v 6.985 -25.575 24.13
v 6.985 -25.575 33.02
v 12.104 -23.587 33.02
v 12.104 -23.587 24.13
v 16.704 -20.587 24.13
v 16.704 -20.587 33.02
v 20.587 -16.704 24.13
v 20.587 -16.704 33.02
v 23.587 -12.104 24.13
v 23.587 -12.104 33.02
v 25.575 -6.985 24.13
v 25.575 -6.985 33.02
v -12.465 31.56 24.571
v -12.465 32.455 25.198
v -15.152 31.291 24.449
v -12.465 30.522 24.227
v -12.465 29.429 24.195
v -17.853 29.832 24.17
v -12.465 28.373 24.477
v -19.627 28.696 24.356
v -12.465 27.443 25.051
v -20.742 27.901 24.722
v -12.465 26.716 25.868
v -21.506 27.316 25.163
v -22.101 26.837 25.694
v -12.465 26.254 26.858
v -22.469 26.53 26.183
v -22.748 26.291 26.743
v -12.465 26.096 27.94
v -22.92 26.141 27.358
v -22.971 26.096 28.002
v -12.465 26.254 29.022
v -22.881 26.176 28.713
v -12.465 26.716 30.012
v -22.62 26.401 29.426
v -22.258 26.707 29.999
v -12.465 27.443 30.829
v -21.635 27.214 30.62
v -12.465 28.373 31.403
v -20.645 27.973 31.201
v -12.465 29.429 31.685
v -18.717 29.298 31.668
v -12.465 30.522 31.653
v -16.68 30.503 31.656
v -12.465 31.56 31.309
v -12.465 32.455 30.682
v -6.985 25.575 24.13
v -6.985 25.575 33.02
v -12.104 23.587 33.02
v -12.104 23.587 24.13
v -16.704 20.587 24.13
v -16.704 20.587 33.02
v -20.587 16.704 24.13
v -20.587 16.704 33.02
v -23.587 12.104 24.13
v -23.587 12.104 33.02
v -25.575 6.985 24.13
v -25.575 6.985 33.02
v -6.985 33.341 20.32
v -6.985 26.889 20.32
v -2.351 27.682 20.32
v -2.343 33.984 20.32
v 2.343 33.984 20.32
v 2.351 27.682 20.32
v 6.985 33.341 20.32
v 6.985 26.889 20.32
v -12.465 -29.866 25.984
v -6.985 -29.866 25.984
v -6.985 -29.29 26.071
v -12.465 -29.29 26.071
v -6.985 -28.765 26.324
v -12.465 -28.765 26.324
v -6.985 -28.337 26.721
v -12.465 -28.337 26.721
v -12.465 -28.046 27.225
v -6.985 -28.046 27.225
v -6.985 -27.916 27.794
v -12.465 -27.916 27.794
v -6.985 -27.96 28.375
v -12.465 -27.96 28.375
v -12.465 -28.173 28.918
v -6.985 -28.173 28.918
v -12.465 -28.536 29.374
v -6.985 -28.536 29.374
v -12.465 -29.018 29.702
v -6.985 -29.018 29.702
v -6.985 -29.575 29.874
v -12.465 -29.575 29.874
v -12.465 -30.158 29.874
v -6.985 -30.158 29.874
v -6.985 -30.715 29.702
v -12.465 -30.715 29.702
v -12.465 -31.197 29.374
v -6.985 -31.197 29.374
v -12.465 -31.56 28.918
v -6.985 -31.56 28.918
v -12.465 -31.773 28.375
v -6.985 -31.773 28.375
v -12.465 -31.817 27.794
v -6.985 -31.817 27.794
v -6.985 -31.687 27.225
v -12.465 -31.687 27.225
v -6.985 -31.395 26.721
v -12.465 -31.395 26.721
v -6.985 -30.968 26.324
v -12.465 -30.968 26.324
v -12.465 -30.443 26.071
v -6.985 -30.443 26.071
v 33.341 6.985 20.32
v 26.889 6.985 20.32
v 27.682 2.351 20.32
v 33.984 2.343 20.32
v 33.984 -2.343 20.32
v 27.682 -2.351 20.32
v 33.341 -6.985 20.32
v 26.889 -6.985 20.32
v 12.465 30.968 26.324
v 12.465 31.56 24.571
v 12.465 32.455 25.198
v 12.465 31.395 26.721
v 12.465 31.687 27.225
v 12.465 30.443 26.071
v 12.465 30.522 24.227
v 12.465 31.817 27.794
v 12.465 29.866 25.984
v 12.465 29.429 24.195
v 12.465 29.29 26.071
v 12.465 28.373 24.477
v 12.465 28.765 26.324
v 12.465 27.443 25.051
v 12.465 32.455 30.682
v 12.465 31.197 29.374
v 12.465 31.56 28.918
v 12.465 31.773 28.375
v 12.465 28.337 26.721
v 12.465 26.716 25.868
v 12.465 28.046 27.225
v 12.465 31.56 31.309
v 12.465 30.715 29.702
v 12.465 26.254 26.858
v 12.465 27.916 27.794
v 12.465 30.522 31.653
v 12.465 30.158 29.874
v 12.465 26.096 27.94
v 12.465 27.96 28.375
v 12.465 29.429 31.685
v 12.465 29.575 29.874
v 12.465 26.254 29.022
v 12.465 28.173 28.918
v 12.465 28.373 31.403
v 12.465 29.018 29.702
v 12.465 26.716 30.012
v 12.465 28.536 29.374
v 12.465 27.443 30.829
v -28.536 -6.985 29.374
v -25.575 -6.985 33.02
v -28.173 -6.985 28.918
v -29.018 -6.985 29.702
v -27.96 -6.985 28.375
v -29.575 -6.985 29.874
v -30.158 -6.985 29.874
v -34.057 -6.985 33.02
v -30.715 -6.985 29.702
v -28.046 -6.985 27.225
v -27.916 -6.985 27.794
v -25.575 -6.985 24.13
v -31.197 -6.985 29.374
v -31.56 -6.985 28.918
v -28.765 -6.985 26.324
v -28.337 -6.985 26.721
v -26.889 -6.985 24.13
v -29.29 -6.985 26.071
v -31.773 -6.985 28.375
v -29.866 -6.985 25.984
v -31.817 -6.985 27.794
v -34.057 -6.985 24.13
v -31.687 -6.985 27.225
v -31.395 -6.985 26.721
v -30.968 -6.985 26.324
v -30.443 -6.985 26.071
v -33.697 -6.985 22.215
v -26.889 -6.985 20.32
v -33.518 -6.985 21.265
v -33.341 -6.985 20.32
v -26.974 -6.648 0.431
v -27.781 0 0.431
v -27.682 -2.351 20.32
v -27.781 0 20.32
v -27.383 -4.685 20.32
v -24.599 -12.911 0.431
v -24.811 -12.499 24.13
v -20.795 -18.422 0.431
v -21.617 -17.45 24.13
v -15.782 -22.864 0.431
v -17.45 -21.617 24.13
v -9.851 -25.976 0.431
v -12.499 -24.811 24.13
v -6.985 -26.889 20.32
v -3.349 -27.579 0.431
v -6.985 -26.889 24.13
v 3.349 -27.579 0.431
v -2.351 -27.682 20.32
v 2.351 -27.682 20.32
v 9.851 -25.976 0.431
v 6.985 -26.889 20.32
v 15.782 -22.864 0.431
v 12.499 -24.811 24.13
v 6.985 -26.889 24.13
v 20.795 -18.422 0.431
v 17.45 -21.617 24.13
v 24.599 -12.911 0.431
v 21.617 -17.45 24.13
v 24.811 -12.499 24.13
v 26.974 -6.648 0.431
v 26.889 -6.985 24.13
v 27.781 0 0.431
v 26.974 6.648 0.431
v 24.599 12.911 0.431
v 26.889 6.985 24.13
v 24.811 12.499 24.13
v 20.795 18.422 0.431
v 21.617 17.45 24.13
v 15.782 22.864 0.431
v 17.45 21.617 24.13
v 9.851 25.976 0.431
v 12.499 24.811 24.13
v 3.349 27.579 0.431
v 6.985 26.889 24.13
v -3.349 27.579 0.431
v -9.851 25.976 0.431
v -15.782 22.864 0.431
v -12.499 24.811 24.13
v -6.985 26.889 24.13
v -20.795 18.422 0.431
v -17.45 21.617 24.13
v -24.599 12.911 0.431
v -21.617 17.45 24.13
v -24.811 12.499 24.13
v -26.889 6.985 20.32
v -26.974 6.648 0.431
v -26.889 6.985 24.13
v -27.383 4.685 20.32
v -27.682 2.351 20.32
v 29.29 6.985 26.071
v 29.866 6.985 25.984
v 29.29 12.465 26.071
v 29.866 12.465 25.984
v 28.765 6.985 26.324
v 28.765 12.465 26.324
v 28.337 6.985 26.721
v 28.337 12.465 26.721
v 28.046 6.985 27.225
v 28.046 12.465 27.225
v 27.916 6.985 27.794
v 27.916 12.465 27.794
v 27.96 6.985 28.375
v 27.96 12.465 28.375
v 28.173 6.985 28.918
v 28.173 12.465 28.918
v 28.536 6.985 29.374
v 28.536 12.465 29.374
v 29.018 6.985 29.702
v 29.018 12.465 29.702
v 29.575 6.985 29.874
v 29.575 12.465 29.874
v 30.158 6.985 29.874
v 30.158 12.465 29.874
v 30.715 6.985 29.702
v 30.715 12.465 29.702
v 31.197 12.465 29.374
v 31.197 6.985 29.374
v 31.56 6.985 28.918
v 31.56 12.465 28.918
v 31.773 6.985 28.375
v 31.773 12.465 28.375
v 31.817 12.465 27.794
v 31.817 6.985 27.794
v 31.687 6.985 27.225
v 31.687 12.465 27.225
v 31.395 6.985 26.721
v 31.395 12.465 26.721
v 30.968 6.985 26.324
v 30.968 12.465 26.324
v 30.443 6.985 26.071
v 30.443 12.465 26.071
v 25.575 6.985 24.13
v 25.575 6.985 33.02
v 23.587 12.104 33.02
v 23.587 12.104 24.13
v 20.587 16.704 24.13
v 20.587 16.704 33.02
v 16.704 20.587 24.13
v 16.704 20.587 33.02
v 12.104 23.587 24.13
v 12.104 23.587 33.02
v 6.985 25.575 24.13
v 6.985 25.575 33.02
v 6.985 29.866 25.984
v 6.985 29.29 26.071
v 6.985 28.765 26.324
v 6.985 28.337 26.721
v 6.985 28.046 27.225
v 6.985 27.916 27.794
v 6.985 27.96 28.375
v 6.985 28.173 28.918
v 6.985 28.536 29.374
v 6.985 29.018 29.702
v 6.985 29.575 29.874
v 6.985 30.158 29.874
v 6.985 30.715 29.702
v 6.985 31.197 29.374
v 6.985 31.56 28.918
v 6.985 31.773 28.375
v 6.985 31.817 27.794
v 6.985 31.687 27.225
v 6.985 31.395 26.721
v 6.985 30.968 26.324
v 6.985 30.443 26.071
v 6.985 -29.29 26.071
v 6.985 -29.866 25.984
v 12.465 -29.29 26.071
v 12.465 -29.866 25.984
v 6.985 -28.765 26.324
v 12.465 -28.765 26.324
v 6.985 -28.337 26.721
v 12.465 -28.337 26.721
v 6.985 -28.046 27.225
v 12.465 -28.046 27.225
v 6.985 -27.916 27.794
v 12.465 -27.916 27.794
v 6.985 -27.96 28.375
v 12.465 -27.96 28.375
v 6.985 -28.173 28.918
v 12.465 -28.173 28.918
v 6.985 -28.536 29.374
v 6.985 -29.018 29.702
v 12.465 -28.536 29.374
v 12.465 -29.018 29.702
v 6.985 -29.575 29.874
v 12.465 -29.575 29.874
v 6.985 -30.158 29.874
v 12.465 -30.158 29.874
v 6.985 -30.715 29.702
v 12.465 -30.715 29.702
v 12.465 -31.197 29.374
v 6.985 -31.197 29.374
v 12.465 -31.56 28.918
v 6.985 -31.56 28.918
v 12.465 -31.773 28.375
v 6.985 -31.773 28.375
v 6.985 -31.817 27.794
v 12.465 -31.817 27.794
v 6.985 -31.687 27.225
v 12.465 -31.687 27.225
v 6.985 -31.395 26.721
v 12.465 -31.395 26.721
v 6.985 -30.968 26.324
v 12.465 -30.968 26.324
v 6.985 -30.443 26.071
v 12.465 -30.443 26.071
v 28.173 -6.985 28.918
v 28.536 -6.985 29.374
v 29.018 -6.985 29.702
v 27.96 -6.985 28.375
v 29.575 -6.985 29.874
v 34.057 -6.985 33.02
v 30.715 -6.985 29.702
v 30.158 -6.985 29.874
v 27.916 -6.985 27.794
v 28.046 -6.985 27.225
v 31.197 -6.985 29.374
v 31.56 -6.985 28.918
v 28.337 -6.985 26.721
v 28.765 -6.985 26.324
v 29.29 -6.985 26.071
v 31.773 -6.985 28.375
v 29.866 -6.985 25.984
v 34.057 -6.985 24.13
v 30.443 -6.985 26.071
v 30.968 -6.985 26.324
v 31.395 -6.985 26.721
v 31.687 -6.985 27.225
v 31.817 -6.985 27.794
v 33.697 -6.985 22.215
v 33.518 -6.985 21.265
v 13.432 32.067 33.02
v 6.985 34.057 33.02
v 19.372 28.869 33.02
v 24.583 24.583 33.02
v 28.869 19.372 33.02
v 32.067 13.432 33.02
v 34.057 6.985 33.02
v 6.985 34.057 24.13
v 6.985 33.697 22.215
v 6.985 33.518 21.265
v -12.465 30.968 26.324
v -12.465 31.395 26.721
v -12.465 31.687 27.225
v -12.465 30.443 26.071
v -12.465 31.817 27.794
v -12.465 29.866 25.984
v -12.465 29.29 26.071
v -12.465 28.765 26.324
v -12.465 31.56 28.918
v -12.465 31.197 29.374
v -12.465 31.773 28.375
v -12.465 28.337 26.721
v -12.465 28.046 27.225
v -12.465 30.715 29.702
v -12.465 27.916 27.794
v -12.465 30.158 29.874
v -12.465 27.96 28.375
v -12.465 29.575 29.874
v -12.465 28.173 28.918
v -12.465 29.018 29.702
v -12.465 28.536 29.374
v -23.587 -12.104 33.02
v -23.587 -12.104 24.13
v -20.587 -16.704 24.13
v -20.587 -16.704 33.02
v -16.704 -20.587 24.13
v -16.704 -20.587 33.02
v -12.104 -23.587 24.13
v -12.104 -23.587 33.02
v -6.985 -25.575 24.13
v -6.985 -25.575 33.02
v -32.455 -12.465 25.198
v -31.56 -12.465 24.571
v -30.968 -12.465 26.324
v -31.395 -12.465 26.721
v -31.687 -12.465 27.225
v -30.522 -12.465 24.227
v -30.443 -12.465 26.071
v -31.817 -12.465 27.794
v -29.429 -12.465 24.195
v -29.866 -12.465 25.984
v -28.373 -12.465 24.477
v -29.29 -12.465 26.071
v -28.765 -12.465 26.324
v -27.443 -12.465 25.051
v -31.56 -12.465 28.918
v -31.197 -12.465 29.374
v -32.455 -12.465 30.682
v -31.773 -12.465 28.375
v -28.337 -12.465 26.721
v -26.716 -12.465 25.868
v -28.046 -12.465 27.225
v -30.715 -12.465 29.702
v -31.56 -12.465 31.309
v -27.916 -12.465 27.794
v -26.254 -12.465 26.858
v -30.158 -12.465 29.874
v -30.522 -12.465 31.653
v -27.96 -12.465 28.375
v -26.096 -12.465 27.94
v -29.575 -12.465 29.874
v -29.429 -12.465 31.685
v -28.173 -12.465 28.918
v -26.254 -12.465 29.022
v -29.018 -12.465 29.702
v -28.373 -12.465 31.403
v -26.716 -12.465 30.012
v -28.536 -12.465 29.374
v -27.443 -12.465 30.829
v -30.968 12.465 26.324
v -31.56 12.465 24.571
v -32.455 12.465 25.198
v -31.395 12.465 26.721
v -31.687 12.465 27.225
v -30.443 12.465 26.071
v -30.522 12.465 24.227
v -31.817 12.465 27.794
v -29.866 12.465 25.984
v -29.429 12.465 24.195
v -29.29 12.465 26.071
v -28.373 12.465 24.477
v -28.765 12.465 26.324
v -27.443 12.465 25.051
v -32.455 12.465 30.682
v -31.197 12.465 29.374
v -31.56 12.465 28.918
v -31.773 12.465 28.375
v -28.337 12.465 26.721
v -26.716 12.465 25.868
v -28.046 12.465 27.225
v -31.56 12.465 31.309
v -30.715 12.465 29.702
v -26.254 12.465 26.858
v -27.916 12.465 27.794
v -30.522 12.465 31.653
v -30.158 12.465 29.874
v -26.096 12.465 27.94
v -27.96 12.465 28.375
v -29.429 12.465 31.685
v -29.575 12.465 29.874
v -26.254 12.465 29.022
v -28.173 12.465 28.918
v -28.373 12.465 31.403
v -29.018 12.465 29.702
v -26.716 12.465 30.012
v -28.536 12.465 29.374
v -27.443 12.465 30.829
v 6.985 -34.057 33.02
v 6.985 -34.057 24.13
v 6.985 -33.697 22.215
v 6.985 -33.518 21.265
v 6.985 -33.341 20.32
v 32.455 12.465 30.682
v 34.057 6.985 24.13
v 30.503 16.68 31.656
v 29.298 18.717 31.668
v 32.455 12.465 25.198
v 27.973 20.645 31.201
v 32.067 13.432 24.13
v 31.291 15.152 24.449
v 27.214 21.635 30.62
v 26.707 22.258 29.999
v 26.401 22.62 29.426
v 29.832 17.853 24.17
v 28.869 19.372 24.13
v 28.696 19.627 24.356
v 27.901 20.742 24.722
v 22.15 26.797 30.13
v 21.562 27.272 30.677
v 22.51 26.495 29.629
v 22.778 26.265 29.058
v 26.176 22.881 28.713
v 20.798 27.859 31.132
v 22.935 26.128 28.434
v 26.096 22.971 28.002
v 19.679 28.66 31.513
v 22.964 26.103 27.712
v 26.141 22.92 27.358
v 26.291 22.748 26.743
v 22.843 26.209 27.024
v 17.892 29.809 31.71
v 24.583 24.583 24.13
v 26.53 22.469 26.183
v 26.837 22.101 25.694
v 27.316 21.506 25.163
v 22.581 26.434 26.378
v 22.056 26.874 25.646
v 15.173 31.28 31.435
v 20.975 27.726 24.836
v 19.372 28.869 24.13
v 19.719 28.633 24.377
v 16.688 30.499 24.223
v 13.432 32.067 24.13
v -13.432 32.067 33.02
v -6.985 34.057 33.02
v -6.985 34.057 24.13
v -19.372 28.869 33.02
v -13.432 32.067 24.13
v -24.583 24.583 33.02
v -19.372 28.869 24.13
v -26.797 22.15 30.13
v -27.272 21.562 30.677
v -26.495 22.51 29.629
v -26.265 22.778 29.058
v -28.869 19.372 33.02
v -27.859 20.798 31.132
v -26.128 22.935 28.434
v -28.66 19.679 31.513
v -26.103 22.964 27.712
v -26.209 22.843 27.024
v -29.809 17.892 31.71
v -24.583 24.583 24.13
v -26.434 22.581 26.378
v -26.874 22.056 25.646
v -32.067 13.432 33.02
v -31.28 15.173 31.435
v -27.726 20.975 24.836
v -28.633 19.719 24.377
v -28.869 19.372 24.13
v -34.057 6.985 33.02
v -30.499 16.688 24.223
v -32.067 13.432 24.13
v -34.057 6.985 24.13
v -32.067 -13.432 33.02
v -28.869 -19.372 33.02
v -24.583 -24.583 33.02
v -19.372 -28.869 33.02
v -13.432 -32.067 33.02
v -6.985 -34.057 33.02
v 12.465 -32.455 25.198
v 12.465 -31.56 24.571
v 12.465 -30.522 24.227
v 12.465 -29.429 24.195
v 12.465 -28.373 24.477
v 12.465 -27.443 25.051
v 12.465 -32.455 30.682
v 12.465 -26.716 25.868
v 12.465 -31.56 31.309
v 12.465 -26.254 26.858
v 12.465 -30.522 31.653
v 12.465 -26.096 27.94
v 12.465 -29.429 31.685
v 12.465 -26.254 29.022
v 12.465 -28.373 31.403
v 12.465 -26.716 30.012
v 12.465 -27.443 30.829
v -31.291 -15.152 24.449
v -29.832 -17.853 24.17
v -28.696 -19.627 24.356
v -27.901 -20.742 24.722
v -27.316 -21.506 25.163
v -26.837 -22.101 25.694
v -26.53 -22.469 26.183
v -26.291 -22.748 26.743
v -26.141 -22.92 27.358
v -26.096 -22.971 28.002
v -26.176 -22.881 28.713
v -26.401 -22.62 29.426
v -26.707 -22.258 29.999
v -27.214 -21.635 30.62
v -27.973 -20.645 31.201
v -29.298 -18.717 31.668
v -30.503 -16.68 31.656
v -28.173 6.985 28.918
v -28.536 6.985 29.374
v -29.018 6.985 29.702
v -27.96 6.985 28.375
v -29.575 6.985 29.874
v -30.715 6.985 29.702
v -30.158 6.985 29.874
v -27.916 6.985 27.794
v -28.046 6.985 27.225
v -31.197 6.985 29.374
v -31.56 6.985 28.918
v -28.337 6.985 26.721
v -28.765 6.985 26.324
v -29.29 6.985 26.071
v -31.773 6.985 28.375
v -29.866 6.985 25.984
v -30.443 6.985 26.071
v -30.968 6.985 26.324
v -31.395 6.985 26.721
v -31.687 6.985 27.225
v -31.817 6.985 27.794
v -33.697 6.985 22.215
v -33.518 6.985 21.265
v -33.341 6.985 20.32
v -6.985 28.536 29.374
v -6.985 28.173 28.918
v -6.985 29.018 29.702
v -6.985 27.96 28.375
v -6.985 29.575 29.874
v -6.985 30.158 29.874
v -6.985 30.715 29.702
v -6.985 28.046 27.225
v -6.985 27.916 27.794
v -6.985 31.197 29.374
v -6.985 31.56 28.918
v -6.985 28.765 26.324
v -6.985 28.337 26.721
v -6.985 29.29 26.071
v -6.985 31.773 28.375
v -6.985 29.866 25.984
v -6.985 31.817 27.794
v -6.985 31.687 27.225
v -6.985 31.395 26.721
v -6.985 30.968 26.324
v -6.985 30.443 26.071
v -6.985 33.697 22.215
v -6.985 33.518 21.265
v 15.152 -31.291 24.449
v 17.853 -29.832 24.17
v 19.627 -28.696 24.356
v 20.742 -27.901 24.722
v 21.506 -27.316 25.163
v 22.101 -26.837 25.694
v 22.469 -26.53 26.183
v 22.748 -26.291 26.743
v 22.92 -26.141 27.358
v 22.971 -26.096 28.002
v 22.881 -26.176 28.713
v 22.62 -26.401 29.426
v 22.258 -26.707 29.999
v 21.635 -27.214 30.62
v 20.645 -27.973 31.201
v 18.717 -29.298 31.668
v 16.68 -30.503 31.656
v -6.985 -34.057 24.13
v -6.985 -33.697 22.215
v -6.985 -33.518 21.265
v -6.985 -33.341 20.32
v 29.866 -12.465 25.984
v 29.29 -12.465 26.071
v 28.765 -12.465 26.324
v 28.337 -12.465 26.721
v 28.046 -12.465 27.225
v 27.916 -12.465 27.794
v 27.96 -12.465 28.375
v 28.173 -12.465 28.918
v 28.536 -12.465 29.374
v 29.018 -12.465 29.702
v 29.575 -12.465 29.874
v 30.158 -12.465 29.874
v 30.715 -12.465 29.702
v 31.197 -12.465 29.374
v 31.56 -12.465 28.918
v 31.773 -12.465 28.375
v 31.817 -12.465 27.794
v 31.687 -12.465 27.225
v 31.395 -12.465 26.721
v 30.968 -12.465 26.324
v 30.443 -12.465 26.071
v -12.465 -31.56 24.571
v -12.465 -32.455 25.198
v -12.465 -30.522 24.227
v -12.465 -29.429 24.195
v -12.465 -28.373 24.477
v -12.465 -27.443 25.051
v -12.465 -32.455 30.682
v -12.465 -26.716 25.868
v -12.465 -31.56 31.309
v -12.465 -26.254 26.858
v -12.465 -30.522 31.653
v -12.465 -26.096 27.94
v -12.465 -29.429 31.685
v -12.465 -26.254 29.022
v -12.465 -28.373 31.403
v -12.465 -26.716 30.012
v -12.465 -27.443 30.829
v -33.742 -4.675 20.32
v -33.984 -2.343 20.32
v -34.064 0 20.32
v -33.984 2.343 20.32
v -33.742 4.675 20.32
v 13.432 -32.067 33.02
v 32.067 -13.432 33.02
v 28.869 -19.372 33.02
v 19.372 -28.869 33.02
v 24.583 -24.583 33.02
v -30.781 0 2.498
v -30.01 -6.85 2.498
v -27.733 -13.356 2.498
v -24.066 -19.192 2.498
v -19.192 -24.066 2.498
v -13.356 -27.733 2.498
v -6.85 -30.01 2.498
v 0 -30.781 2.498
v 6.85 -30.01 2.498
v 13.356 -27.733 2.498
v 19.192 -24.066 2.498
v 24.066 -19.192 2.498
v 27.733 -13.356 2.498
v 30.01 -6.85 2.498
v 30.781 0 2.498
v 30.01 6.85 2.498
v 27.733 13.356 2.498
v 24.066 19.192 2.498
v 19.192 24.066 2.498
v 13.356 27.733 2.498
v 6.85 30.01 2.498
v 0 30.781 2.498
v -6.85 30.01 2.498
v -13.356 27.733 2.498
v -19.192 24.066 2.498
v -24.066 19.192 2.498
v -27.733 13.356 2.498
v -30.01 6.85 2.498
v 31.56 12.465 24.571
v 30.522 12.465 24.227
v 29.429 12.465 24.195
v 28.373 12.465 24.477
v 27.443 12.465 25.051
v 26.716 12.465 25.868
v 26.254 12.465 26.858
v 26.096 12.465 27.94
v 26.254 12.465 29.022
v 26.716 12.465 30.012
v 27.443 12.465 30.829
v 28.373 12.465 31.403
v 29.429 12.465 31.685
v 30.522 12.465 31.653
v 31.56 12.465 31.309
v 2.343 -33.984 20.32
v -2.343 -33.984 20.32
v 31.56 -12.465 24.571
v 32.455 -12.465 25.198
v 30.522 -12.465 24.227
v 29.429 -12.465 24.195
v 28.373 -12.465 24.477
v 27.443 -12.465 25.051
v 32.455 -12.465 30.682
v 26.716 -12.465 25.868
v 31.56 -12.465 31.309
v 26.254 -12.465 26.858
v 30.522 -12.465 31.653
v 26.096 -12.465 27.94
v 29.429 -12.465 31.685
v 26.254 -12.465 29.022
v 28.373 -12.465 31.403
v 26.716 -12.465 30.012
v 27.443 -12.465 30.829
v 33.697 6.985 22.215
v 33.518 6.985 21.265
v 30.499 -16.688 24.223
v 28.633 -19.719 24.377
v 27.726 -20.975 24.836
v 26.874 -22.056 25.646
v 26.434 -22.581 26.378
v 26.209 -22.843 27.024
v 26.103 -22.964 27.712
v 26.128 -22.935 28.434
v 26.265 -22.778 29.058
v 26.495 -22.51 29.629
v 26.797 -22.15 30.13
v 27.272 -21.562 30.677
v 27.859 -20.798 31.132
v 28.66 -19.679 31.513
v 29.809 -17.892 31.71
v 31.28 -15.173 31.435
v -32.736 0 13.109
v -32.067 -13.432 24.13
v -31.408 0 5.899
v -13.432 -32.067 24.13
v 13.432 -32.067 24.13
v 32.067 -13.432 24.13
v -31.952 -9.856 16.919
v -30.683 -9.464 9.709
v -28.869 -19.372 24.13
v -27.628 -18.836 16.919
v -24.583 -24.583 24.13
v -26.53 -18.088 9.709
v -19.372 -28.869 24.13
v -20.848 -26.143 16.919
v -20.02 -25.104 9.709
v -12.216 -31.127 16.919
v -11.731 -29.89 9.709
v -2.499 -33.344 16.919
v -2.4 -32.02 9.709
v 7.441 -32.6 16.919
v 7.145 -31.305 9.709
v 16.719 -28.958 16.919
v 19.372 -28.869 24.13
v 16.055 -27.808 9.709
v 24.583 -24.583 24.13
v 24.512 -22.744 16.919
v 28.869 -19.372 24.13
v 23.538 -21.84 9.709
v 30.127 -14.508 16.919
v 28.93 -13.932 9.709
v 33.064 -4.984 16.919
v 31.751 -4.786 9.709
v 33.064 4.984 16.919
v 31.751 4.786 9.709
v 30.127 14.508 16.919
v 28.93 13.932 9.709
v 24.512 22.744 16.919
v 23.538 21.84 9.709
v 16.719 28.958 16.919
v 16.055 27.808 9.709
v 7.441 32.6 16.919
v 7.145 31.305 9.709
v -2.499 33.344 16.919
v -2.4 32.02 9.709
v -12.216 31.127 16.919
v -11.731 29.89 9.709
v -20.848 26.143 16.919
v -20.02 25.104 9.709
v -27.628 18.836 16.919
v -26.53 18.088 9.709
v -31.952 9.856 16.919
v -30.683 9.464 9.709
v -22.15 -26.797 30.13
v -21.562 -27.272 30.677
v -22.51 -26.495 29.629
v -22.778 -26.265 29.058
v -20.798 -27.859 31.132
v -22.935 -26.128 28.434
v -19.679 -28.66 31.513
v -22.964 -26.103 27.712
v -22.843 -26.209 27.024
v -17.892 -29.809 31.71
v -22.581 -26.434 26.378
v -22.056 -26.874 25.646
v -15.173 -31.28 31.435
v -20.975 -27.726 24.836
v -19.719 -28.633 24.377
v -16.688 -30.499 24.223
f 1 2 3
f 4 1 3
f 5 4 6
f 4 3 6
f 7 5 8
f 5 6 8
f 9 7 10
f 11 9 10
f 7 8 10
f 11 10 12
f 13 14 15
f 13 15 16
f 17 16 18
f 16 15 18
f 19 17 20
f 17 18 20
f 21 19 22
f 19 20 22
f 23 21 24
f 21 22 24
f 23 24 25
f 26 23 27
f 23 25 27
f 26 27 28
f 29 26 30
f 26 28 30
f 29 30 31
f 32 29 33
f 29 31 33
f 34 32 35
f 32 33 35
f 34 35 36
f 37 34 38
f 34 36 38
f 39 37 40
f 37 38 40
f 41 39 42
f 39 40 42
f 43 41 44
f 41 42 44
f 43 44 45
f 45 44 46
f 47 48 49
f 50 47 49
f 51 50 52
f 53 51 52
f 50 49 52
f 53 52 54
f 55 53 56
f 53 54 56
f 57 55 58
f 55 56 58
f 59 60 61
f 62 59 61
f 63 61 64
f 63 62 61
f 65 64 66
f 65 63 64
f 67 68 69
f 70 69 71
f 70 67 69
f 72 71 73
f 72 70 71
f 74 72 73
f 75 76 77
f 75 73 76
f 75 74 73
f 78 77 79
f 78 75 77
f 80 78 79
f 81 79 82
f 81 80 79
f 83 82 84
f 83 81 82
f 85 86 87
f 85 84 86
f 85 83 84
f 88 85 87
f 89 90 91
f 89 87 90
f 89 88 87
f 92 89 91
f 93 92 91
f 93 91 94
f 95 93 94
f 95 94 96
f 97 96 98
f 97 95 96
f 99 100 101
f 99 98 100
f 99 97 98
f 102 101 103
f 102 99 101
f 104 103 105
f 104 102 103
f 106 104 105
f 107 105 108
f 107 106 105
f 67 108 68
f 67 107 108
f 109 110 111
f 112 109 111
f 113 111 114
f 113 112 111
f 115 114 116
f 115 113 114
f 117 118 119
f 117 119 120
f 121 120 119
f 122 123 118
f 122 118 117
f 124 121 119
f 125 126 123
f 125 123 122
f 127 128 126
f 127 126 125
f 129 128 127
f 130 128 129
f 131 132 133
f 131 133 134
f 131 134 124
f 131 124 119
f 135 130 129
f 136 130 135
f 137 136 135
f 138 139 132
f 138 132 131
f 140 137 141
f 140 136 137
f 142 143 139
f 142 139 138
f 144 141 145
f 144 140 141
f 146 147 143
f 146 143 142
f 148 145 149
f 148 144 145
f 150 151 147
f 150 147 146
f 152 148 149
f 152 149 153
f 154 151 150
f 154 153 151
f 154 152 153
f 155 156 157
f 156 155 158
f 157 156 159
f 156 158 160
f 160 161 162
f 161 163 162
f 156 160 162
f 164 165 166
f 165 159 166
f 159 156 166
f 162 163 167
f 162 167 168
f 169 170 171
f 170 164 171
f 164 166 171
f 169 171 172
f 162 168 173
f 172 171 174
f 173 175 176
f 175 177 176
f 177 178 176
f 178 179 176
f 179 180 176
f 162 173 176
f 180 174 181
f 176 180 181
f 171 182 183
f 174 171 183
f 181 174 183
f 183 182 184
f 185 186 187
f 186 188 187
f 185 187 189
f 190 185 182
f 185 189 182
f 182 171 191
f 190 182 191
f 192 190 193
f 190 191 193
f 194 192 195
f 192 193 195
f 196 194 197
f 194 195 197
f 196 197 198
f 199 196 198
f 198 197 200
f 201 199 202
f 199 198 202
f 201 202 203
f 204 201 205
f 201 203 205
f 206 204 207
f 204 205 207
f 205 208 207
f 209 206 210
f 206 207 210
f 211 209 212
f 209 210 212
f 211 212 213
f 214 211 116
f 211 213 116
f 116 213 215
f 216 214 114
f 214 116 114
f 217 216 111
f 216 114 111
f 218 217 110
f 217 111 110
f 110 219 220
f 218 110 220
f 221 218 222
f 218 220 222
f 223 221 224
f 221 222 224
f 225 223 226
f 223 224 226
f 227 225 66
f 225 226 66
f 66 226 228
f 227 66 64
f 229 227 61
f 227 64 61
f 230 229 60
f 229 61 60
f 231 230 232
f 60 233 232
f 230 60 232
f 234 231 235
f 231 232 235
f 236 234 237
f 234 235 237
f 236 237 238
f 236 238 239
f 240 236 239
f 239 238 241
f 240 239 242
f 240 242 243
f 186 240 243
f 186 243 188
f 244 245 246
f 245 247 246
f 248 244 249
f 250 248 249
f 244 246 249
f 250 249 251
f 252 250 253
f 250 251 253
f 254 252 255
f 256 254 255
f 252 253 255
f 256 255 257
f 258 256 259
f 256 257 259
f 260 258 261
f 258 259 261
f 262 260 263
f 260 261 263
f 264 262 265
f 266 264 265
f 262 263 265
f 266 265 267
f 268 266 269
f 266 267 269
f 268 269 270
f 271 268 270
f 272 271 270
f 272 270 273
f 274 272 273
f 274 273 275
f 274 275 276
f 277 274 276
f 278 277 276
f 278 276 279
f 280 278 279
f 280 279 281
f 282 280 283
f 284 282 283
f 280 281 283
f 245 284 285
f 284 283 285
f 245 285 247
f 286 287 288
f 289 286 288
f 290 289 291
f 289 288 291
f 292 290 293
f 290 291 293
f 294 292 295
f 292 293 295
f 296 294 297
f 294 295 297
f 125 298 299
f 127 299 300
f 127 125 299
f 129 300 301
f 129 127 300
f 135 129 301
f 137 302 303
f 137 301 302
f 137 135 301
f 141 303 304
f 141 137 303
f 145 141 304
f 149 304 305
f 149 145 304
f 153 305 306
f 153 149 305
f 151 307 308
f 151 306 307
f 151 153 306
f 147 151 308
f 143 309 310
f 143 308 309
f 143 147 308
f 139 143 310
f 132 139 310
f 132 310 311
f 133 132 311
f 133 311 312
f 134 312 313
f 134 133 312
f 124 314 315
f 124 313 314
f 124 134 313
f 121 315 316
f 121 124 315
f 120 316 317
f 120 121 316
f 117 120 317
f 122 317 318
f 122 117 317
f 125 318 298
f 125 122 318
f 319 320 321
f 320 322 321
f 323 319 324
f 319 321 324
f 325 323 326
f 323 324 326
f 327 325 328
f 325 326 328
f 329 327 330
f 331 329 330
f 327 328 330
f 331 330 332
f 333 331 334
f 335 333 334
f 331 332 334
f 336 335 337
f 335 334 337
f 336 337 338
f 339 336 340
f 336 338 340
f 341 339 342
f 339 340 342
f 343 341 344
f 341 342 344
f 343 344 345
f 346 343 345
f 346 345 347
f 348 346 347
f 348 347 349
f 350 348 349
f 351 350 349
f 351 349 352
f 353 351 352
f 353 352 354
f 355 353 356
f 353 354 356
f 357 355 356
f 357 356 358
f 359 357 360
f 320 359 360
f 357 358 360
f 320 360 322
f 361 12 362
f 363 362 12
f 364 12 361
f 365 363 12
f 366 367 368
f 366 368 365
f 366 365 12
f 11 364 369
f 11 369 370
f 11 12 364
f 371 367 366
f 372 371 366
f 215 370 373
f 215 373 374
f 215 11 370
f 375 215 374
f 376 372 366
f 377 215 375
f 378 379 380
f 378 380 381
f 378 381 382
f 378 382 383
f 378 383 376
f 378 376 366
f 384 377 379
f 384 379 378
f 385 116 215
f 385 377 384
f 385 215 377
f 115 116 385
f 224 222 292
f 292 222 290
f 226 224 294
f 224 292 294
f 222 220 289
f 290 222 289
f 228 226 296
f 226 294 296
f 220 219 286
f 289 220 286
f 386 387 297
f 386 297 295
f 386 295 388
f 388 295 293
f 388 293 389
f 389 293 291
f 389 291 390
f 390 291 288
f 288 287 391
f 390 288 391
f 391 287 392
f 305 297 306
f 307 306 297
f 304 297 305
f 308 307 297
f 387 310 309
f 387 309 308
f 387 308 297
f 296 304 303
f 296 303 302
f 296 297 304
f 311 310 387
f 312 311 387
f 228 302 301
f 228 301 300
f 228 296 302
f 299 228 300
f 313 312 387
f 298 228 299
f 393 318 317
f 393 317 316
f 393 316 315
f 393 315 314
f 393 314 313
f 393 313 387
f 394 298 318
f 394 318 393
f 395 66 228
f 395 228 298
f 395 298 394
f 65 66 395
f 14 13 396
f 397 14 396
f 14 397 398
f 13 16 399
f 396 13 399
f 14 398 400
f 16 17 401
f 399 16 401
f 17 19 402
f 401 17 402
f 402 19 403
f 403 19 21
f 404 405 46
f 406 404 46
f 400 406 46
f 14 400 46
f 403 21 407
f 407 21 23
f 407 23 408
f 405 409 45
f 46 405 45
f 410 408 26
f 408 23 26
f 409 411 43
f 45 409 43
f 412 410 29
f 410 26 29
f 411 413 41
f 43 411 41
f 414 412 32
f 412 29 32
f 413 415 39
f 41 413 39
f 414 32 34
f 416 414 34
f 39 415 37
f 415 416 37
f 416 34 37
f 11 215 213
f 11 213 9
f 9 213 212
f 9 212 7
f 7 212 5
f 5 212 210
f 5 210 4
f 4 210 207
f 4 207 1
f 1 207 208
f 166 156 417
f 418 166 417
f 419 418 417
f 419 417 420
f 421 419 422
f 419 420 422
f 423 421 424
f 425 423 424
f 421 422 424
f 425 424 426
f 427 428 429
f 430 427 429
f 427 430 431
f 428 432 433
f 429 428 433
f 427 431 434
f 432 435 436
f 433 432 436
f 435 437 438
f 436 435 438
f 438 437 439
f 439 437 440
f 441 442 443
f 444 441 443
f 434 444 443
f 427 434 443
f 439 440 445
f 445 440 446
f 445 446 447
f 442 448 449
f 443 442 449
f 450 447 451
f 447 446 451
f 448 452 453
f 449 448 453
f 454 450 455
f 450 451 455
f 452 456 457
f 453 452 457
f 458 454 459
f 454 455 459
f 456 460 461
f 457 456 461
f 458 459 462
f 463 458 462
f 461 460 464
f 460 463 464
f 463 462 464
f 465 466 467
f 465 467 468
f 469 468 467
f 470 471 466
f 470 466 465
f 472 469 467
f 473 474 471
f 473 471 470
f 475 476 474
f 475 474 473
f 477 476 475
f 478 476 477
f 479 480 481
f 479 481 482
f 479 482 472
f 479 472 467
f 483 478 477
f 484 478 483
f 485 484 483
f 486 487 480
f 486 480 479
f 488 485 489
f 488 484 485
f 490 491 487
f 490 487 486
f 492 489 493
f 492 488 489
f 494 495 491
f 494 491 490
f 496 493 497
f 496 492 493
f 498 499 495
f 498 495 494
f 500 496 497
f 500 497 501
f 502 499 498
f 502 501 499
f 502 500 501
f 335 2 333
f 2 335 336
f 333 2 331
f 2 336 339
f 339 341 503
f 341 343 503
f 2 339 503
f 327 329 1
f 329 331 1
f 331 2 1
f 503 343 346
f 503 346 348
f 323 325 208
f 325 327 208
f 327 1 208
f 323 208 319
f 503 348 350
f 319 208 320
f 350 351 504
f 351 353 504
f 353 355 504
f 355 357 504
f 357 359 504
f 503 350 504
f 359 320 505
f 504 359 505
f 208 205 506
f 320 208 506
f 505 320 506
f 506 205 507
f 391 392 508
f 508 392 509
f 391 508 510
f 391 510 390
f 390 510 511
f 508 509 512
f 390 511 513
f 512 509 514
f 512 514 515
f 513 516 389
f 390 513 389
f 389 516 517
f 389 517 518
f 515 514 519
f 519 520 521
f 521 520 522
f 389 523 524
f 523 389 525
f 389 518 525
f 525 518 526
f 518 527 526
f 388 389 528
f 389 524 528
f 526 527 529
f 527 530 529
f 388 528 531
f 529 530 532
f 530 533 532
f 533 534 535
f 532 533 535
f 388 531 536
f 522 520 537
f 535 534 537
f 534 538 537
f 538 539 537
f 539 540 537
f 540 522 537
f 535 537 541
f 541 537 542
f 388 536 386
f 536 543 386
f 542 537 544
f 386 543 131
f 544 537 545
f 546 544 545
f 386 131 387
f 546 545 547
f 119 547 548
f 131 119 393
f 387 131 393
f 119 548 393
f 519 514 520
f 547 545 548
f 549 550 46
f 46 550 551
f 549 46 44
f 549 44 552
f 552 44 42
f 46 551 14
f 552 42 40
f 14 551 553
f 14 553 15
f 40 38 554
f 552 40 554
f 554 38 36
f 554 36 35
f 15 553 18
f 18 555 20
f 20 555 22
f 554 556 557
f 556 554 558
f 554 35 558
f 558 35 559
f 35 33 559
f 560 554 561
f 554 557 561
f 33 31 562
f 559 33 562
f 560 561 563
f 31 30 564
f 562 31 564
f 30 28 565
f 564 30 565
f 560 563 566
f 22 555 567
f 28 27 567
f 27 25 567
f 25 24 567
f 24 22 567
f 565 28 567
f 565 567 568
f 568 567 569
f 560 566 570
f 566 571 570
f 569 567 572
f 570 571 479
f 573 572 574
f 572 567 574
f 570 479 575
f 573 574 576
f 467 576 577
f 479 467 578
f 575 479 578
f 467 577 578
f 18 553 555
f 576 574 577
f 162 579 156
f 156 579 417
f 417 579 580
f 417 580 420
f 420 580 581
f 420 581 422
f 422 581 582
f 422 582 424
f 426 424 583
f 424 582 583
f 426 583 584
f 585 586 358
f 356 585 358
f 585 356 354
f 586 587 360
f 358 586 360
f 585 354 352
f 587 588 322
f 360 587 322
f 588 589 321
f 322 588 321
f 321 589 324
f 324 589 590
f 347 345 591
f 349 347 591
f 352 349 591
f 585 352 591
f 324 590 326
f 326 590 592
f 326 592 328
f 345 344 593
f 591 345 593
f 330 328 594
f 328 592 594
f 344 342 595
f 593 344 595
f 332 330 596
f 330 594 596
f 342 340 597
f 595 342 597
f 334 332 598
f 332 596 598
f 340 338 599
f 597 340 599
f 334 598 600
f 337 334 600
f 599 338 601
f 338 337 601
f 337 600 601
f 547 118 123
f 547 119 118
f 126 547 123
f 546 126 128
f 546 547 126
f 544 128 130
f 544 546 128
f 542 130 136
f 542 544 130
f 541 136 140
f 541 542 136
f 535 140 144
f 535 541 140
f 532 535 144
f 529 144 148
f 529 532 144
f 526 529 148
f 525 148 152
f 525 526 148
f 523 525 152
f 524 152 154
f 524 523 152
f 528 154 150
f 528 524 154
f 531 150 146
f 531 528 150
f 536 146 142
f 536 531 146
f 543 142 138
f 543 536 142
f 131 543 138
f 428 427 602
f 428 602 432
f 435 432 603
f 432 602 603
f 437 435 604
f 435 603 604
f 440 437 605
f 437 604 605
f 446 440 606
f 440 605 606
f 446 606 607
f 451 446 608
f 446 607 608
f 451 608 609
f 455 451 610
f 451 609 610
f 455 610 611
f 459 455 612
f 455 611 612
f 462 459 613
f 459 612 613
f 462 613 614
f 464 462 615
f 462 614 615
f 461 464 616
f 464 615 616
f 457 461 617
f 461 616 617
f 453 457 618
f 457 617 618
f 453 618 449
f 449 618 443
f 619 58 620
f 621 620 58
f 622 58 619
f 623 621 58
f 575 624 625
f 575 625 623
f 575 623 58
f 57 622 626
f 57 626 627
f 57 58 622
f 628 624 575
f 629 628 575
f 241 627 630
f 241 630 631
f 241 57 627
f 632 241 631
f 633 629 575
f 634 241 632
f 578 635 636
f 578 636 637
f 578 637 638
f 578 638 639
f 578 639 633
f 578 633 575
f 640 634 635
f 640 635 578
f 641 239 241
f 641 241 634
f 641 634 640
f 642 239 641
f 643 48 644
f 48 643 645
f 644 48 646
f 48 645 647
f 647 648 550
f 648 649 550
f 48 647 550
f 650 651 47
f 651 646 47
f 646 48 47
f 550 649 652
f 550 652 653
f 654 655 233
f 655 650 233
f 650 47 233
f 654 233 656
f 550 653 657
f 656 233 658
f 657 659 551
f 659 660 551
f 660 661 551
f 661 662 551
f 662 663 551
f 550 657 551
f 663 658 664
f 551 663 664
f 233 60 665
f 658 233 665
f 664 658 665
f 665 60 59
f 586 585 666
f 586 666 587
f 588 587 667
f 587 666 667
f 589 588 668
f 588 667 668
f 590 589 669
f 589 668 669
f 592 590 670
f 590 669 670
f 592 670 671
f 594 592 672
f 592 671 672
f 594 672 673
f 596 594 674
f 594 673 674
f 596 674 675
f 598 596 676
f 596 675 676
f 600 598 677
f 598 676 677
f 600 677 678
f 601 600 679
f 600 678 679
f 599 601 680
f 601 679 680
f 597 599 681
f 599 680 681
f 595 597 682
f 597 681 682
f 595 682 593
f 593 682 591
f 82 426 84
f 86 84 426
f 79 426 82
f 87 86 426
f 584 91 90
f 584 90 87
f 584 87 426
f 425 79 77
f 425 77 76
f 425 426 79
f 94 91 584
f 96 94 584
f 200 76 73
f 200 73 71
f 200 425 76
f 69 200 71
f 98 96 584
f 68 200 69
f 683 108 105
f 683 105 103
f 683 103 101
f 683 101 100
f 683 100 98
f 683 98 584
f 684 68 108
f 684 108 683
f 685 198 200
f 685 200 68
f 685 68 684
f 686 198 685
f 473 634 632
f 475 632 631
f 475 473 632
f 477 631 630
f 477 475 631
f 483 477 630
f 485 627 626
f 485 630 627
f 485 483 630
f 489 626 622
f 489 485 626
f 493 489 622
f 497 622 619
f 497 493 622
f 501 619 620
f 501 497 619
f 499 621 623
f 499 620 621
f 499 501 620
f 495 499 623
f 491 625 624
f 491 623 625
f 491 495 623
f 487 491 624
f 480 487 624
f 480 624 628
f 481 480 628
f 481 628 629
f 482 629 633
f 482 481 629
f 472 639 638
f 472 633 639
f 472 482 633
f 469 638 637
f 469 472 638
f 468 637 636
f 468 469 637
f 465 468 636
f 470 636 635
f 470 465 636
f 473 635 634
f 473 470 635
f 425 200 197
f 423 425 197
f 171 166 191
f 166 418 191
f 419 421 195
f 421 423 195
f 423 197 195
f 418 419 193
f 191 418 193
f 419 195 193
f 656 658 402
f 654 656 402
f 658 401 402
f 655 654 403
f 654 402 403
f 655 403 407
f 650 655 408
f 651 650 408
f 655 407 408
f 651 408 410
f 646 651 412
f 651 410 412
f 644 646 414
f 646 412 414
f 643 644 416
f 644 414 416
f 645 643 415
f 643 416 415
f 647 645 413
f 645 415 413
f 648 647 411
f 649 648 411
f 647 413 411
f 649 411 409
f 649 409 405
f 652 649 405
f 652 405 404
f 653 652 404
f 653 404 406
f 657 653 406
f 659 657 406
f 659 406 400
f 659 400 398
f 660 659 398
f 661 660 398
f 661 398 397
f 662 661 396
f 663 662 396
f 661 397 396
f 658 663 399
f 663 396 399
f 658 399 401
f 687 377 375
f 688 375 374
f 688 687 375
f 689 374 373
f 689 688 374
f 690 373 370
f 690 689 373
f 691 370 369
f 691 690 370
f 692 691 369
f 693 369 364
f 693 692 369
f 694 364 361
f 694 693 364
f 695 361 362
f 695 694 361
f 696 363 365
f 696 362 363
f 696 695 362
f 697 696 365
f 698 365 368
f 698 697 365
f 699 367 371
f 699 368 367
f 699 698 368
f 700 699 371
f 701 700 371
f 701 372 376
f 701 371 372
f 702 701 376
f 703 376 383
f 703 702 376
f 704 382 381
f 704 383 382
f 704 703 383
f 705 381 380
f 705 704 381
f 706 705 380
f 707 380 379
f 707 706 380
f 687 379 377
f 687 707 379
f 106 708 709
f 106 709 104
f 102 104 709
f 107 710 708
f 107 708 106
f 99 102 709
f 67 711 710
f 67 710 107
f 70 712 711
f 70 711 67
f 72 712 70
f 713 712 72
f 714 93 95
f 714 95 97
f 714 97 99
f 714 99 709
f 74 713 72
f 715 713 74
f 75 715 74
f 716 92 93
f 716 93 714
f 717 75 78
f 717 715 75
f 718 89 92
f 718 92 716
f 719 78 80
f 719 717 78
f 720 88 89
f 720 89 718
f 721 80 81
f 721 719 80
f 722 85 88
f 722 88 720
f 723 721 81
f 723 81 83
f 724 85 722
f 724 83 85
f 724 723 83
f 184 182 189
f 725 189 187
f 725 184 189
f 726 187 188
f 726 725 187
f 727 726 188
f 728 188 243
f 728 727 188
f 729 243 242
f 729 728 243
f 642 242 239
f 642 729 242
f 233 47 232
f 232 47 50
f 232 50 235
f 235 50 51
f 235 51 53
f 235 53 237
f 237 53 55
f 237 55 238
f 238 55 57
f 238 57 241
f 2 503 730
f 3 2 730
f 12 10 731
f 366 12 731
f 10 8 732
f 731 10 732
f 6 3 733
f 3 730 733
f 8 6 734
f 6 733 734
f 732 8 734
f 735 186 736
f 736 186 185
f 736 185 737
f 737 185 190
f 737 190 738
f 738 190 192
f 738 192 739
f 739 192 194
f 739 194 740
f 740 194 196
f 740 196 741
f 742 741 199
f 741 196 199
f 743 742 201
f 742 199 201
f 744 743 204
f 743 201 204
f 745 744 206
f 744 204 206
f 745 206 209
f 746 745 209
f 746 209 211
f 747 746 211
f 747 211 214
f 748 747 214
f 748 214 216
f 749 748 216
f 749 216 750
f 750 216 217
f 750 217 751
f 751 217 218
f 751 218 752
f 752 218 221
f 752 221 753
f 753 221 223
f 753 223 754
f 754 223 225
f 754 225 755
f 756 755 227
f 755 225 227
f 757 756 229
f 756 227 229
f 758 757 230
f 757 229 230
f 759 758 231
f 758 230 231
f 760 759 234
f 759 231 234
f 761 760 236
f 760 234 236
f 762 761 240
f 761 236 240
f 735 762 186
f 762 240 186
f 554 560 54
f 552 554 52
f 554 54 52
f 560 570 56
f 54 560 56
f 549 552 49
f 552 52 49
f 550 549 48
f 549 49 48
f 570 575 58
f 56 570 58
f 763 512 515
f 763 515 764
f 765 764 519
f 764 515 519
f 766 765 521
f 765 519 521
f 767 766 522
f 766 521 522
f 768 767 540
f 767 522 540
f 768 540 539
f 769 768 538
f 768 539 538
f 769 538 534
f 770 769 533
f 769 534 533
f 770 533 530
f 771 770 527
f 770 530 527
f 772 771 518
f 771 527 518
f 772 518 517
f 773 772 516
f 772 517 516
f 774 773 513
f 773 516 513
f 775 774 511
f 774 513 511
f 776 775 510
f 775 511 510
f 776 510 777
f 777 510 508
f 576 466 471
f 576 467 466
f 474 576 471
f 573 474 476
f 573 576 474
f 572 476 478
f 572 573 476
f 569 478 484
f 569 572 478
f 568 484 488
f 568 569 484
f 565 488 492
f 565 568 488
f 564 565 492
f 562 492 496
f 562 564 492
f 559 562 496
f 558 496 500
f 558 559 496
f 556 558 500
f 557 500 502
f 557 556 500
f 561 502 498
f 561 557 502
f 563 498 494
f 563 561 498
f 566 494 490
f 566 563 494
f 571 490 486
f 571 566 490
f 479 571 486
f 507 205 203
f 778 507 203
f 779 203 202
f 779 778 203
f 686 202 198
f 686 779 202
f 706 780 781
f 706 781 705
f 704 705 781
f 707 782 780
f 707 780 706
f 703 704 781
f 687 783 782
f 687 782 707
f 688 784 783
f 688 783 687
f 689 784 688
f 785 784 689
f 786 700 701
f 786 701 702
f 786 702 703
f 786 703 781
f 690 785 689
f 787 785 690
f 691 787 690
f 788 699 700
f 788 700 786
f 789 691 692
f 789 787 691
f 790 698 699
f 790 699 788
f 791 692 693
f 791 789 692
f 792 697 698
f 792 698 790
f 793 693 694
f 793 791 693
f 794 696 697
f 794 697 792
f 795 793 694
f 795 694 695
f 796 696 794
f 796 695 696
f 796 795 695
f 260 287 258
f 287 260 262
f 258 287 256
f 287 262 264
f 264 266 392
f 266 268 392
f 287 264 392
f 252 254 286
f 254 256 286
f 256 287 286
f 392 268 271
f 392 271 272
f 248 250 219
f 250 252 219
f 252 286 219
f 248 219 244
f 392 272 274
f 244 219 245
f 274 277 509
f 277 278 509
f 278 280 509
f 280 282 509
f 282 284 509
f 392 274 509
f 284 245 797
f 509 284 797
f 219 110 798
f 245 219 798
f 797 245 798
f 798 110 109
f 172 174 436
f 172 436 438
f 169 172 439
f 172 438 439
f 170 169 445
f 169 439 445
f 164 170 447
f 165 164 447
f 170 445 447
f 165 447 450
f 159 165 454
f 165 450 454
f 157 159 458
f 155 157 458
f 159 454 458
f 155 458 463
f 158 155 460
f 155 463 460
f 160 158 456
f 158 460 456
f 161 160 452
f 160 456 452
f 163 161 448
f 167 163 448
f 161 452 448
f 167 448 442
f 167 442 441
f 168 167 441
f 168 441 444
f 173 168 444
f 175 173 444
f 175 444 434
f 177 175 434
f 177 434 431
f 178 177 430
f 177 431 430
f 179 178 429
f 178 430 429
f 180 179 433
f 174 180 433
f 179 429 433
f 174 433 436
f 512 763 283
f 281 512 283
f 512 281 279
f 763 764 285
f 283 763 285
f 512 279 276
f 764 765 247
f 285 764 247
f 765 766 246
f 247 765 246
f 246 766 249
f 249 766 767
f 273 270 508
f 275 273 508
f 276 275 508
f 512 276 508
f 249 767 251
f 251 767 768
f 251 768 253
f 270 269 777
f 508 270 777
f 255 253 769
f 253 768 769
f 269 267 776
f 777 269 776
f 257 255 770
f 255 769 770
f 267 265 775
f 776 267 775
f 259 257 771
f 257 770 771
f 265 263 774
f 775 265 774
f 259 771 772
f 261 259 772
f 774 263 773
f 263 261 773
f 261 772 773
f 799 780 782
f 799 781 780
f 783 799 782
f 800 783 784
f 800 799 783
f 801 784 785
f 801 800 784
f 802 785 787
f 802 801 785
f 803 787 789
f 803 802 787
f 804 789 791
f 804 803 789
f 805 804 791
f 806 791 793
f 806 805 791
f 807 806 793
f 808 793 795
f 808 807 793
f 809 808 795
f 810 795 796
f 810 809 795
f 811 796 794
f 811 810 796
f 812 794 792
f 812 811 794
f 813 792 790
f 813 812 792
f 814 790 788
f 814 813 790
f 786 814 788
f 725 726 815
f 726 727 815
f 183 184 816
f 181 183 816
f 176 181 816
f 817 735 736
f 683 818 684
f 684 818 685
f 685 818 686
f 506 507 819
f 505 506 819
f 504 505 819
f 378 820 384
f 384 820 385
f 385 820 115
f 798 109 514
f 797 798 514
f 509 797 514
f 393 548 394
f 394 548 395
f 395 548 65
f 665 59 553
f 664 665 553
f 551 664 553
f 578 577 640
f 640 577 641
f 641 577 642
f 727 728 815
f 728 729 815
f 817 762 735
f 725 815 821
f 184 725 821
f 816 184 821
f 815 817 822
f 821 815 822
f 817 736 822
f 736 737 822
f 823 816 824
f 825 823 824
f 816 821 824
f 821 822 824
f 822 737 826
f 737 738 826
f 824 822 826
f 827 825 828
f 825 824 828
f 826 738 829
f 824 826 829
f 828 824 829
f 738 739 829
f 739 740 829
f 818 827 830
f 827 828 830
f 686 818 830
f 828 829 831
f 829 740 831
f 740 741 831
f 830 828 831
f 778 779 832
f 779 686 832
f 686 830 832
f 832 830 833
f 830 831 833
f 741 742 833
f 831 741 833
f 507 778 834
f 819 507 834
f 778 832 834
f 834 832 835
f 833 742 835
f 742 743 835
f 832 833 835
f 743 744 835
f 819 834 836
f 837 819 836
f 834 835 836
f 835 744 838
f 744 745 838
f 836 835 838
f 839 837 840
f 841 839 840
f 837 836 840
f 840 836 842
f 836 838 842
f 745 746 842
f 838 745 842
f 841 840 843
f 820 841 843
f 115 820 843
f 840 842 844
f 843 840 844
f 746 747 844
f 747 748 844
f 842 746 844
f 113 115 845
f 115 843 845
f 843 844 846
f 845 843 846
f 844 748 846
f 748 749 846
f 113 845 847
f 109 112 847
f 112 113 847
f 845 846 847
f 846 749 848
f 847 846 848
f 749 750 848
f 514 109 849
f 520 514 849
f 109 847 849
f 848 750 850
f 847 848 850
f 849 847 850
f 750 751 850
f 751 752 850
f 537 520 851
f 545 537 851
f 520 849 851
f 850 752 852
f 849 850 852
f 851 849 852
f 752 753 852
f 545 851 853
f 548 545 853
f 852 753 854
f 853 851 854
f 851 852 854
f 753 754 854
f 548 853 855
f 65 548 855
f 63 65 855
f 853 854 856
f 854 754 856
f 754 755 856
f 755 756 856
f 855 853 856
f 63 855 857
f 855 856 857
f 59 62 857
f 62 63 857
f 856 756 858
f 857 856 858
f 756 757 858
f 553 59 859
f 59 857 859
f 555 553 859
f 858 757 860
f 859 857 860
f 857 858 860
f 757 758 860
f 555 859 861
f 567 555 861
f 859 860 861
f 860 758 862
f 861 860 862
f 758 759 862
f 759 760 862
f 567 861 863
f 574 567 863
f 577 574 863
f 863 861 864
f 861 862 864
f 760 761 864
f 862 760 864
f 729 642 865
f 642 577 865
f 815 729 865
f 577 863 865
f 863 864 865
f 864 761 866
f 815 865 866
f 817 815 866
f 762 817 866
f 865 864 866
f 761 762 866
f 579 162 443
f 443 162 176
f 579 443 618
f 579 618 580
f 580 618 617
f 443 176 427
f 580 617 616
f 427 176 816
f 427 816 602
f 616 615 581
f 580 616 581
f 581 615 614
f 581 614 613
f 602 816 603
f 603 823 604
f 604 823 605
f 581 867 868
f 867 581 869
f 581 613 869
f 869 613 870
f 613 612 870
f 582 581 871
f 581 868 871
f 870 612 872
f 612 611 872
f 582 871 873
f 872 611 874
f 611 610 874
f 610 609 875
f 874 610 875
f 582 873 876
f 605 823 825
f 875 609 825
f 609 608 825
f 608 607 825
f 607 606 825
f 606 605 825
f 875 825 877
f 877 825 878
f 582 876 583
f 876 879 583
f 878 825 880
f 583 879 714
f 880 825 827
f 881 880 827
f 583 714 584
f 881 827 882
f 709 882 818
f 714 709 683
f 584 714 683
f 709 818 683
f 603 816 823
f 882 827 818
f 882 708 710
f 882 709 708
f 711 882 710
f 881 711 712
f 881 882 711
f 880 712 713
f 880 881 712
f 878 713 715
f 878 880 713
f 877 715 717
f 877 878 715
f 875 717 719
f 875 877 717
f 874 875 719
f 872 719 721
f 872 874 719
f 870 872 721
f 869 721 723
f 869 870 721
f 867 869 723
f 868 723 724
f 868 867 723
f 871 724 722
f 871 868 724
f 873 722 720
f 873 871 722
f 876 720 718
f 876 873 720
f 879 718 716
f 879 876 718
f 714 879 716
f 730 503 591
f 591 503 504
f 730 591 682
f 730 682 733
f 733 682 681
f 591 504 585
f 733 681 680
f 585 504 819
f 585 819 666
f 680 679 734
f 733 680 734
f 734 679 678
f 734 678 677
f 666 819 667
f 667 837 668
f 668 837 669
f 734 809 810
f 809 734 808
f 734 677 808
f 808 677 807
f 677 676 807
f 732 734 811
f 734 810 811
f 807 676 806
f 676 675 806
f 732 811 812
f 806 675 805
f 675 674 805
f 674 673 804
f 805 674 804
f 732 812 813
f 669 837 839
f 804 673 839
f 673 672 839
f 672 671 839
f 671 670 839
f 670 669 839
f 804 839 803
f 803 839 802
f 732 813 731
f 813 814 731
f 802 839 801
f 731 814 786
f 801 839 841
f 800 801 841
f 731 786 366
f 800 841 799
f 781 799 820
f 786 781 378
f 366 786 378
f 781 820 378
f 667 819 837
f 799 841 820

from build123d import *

# Parameters (mm, degrees)
PULLEY_RECESS_START = -12.7
SKETCH5_W           = 13.97
SKETCH5_H           = 12.7
PULLEY_RECESS_DEPTH = 72.92587845
CIRPATTERN1_COUNT   = 4
CHAMFER1_SIZE       = 2.54
CHAMFER1_SIZE_2     = 3.165934508


with BuildPart() as part:
    # Sketch1 → base_ring (revolve)
    with BuildSketch(Plane.YZ, mode=Mode.PRIVATE) as base_ring_sk:
        Polygon((27.78125, 0), (27.78125, 24.13), (26.51125, 24.13), (26.51125, 33.02), (34.76625, 33.02), (34.76625, 24.13), (30.32125, 0), align=None)
    revolve(base_ring_sk.sketch.rotate(Axis((0, 0, 0), (0, 0, 1)), 90), axis=Axis((0, 0, 0), (0, 0, 1)))

    # Sketch5 → pulley_recess (cut)
    with BuildSketch(Plane.XY.offset(33.02).offset(PULLEY_RECESS_START)):
        with Locations((0, 31.924521531)):
            Rectangle(SKETCH5_W, SKETCH5_H)
    pulley_recess = extrude(amount=PULLEY_RECESS_DEPTH, mode=Mode.SUBTRACT)

    # Sketch8 → pulley_bolt_hole (revolve, cut)
    with BuildSketch(Plane(origin=(34.76625, 29.86633275, 27.94), x_dir=(0, 0, -1), z_dir=(0, 1, 0))):
        Polygon((0, 0), (0, 39.275163199), (1.9558, 38.1), (1.9558, 22.3012), (3.77063, 22.3012), (3.77063, 0), align=None)
    pulley_bolt_hole = revolve(axis=Axis((41.11625, 29.86633275, 27.94), (-1, 0, 0)), mode=Mode.SUBTRACT)

    # bolthole_mirror: pulley_bolt_hole across plane
    add(pulley_bolt_hole.mirror(Plane(origin=(0, 0, 0), x_dir=(0, 0, 1), z_dir=(1, 0, 0))), mode=Mode.SUBTRACT)

    # CirPattern1: pulley_recess, pulley_bolt_hole ×4 about axis
    cirpattern1_axis = Axis((0, 0, 0), (0, 0, 1))
    add([pulley_recess.rotate(cirpattern1_axis, i * 360 / CIRPATTERN1_COUNT) for i in range(1, CIRPATTERN1_COUNT)], mode=Mode.SUBTRACT)
    add([pulley_bolt_hole.rotate(cirpattern1_axis, i * 360 / CIRPATTERN1_COUNT) for i in range(1, CIRPATTERN1_COUNT)], mode=Mode.SUBTRACT)

    # CirPattern1 copy 1 sketch → CirPattern1 copy 1 (revolve, cut)
    with BuildSketch(Plane(origin=(-29.86633275, -34.76625, 27.94), x_dir=(0, 0, -1), z_dir=(-1, 0, 0))):
        Polygon((0, 0), (0, -39.275163199), (1.9558, -38.1), (1.9558, -22.3012), (3.77063, -22.3012), (3.77063, 0), align=None)
    revolve(axis=Axis((-29.86633275, -41.11625, 27.94), (0, -1, 0)), mode=Mode.SUBTRACT)

    # CirPattern1 copy 2 sketch → CirPattern1 copy 2 (revolve, cut)
    with BuildSketch(Plane(origin=(34.76625, -29.86633275, 27.94), x_dir=(0, 0, -1), z_dir=(0, -1, 0))):
        Polygon((0, 0), (0, -39.275163199), (1.9558, -38.1), (1.9558, -22.3012), (3.77063, -22.3012), (3.77063, 0), align=None)
    revolve(axis=Axis((41.11625, -29.86633275, 27.94), (1, 0, 0)), mode=Mode.SUBTRACT)

    # CirPattern1 copy 3 sketch → CirPattern1 copy 3 (revolve, cut)
    with BuildSketch(Plane(origin=(29.86633275, 34.76625, 27.94), x_dir=(0, 0, -1), z_dir=(1, 0, 0))):
        Polygon((0, 0), (0, -39.275163199), (1.9558, -38.1), (1.9558, -22.3012), (3.77063, -22.3012), (3.77063, 0), align=None)
    revolve(axis=Axis((29.86633275, 41.11625, 27.94), (0, 1, 0)), mode=Mode.SUBTRACT)

    # Chamfer1
    # the kernel refuses this chamfer: 3.165934508, 2.54 mm, written as the material it takes off along each edge
    with BuildSketch(Plane(origin=(0, 0, 0), x_dir=(-1, 0, 0), z_dir=(0, 1, 0))) as chamfer1_piece_1:
        Polygon((30.32125 + CHAMFER1_SIZE * 0.181162429477, CHAMFER1_SIZE * 0.983453188589), (30.32125 - CHAMFER1_SIZE_2, 0), (30.32125, 0), align=None)
    revolve(axis=Axis((0, 0, 0), (0, 0, 1)), mode=Mode.SUBTRACT)


solid = part.part
